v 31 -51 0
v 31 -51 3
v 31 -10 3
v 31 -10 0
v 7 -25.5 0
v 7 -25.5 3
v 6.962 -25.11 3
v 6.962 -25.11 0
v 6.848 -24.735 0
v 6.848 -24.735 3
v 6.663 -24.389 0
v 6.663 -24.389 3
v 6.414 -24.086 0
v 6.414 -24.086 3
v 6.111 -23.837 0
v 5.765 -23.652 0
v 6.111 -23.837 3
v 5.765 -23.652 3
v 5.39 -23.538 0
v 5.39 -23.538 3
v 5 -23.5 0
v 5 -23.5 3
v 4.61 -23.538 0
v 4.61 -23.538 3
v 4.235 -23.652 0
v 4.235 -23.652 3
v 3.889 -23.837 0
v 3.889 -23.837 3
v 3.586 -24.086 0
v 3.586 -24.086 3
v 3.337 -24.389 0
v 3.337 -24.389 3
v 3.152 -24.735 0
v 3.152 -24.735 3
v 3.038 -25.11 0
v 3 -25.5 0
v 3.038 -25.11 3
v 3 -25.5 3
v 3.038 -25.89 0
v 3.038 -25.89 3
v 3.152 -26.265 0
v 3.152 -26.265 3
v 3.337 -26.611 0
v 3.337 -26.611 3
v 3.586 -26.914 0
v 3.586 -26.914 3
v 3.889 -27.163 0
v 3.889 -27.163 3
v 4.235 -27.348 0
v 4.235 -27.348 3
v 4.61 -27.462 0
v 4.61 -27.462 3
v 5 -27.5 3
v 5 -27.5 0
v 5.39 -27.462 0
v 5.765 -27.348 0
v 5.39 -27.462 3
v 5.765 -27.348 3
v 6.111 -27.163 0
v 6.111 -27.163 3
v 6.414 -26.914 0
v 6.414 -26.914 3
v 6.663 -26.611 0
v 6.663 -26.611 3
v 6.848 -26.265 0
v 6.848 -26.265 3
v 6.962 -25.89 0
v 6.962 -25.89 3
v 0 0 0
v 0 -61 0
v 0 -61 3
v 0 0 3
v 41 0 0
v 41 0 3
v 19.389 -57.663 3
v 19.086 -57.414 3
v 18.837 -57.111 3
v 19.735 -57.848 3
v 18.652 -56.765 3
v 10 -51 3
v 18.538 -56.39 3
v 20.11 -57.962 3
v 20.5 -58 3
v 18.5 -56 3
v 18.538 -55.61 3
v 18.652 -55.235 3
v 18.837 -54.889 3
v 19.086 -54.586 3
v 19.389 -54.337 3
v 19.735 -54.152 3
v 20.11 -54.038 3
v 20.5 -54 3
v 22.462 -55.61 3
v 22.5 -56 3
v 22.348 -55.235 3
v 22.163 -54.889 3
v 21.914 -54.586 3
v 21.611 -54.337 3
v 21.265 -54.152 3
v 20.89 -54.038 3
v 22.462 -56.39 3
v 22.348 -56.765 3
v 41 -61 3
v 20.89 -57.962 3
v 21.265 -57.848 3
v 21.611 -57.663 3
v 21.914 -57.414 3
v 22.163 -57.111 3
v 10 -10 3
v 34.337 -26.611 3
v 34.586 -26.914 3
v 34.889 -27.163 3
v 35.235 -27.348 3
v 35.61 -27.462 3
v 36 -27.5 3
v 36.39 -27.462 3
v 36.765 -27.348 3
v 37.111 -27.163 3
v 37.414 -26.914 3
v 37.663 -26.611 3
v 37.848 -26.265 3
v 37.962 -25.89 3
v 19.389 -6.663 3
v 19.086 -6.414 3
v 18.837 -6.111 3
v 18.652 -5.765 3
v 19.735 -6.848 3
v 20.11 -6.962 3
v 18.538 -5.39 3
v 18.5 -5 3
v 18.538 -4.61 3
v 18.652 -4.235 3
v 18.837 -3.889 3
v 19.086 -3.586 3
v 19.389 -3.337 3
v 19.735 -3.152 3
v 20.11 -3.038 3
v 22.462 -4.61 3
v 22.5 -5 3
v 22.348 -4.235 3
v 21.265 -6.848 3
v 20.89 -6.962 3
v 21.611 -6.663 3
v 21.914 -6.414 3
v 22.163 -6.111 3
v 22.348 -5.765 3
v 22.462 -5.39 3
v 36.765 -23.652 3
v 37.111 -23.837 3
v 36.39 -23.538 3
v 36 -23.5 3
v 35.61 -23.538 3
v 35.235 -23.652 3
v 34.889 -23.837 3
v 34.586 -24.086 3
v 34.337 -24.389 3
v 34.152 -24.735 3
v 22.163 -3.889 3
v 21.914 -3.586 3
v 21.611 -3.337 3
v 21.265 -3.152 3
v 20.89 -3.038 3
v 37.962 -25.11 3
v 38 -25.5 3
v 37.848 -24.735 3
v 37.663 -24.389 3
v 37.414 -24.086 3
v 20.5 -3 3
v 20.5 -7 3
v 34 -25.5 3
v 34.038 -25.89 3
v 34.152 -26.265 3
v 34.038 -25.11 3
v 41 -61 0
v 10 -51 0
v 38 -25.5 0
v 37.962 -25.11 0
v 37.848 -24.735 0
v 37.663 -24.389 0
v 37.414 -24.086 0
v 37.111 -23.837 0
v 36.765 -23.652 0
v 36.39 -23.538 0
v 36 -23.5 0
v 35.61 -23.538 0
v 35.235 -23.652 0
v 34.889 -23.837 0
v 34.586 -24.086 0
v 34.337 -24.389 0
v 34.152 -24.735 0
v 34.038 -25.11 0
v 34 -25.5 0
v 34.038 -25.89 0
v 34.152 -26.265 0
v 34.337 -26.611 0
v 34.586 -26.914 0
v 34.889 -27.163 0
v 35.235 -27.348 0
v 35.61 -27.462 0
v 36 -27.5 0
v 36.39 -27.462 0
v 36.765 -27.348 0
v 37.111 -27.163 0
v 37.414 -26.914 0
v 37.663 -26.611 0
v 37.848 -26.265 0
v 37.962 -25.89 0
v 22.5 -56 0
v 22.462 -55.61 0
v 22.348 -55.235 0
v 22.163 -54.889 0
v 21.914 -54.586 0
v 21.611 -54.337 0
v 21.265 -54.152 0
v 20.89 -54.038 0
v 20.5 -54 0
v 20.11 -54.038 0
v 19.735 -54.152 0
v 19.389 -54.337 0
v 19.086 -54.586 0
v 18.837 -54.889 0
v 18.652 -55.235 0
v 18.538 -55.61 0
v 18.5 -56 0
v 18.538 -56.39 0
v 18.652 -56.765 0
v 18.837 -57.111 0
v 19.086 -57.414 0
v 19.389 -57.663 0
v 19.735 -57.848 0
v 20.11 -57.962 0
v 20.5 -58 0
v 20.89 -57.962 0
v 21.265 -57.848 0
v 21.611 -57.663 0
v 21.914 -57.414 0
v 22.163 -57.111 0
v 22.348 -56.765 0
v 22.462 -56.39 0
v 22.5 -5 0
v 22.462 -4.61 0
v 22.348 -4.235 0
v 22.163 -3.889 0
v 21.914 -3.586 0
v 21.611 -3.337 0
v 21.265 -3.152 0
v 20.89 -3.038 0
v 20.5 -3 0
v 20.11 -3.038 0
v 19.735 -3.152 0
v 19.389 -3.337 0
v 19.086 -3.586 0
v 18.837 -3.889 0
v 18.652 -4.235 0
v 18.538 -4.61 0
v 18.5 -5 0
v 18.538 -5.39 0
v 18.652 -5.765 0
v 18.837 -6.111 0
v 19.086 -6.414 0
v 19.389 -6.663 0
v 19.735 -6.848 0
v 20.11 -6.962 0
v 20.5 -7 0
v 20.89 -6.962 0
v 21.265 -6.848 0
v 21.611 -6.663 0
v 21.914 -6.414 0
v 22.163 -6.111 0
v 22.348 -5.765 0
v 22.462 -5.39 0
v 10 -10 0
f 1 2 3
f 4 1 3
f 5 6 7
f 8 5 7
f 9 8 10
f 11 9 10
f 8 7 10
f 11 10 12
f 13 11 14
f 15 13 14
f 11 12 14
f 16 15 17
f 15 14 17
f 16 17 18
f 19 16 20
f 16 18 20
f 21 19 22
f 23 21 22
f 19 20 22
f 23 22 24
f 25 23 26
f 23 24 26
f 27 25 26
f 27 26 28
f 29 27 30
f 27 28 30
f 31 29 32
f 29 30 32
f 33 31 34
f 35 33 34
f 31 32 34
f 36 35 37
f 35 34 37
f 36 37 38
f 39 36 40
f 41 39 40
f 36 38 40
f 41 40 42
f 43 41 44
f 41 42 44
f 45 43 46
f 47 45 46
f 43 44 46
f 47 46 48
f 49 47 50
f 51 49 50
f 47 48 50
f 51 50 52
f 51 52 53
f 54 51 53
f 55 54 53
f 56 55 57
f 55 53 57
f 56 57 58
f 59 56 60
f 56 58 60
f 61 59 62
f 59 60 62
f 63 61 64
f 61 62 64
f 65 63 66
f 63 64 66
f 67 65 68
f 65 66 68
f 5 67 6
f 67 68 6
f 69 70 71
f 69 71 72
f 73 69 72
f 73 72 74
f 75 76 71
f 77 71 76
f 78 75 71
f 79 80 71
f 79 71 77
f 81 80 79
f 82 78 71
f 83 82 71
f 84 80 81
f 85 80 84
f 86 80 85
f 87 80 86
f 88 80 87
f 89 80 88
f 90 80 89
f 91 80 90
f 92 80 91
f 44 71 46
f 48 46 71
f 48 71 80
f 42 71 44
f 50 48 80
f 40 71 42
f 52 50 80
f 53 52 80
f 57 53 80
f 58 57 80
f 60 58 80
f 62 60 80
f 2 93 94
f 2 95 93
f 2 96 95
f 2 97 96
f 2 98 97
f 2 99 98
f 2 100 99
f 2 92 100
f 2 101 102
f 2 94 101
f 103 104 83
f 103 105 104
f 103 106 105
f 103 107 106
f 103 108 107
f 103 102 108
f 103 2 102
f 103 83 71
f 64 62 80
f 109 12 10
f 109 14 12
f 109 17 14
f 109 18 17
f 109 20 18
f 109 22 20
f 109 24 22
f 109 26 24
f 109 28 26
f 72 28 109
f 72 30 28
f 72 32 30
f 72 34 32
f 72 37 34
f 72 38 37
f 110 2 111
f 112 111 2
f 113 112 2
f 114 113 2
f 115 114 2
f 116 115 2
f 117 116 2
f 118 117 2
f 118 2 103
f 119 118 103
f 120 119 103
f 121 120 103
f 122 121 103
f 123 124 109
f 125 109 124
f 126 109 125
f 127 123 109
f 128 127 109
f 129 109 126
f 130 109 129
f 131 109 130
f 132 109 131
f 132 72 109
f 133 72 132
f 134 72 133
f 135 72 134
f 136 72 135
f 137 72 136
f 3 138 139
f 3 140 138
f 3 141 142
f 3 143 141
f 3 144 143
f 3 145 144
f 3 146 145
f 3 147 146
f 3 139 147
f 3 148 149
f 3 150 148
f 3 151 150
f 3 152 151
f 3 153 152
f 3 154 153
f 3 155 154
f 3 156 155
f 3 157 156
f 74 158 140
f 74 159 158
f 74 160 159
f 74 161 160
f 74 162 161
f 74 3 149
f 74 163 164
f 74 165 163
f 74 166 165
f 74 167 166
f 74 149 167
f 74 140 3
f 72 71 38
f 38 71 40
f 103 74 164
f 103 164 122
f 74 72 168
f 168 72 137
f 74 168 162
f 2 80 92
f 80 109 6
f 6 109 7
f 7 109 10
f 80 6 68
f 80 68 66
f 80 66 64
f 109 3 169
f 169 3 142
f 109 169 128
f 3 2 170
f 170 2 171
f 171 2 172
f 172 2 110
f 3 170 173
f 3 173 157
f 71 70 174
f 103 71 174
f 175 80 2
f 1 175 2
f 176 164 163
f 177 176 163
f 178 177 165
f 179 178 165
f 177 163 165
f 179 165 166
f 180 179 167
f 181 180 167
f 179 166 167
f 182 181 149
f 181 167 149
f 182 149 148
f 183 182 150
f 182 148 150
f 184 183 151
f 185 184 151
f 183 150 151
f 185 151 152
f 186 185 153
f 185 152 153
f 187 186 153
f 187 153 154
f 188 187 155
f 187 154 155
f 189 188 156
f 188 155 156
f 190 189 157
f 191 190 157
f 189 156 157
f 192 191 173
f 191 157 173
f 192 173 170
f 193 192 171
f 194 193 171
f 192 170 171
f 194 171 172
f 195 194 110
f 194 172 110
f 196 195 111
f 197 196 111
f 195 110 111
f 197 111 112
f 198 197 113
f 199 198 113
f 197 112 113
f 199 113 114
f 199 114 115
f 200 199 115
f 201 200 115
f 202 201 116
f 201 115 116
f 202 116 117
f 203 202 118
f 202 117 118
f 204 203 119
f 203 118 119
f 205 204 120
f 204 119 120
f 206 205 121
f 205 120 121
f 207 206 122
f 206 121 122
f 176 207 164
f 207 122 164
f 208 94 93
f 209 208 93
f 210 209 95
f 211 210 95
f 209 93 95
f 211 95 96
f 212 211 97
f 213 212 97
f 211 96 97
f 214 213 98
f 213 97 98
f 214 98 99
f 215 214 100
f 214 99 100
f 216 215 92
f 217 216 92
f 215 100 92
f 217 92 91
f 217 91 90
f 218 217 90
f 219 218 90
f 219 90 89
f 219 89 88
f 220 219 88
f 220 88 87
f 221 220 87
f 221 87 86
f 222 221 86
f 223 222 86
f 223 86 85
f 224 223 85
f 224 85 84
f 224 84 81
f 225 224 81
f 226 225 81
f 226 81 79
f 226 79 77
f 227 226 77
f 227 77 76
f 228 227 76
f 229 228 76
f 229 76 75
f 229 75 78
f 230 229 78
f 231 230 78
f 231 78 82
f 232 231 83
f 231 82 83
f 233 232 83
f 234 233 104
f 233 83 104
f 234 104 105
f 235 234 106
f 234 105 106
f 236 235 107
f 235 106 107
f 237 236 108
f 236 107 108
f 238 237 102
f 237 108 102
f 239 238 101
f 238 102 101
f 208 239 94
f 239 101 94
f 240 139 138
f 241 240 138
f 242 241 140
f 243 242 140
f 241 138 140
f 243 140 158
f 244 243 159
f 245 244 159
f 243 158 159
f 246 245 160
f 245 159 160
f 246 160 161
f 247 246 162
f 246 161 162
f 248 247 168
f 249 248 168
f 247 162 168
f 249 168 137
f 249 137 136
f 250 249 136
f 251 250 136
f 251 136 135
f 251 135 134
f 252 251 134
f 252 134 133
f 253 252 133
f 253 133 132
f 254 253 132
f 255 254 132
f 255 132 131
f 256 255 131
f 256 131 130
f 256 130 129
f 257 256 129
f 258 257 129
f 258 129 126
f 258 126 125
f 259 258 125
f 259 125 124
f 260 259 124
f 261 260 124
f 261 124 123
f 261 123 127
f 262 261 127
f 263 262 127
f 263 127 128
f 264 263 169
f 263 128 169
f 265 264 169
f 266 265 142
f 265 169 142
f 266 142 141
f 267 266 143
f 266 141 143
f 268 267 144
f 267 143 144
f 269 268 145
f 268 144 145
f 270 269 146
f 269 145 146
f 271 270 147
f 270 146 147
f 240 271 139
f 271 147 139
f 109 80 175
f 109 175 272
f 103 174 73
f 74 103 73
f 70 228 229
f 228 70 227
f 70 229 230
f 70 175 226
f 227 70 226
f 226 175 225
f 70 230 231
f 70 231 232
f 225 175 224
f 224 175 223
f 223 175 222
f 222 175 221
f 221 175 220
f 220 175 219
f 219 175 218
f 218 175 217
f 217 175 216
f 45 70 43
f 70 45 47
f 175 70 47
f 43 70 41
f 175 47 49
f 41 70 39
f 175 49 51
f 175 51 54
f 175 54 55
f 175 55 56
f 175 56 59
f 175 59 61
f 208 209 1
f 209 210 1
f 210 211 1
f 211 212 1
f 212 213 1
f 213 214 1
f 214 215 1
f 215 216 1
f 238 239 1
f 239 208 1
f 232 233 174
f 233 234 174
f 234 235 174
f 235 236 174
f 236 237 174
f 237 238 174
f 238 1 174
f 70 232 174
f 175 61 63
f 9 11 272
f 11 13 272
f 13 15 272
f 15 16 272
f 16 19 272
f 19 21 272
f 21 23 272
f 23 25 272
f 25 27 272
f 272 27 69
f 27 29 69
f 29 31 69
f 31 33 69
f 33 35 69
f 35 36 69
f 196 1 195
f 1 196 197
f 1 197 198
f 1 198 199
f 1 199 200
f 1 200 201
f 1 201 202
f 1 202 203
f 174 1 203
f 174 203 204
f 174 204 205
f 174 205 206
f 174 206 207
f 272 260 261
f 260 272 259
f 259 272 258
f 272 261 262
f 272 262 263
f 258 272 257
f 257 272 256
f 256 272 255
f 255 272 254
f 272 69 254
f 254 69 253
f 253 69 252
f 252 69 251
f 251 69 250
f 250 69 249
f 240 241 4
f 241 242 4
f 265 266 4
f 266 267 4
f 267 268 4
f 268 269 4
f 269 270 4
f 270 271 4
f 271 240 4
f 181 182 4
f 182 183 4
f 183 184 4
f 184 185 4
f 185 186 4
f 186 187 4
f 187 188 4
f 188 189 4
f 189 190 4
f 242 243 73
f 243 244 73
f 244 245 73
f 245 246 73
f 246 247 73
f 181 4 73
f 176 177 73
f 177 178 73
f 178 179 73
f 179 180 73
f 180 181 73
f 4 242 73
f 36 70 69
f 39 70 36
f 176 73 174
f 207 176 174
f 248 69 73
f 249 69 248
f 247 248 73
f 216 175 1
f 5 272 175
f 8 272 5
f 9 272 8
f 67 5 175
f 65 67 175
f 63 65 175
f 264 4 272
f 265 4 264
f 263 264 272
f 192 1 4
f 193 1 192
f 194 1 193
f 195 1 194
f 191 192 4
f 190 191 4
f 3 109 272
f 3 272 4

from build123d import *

# Parameters (mm, degrees)
SKETCH1_W           = 41
SKETCH1_H           = 61
BOSS_EXTRUDE1_DEPTH = 3
SKETCH2_W           = 21
SKETCH2_H           = 41
CUT_EXTRUDE1_DEPTH  = 3
SKETCH3_R           = 2
CUT_EXTRUDE2_DEPTH  = 3
SKETCH4_R           = 2
CUT_EXTRUDE3_DEPTH  = 10


with BuildPart() as part:
    # Sketch1 → Boss-Extrude1 (new body)
    with BuildSketch(Plane.XY):
        with Locations((20.5, -30.5)):
            Rectangle(SKETCH1_W, SKETCH1_H)
    extrude(amount=BOSS_EXTRUDE1_DEPTH)

    # Sketch2 → Cut-Extrude1 (cut)
    with BuildSketch(Plane.XY.offset(3)):
        with Locations((20.5, -30.5)):
            Rectangle(SKETCH2_W, SKETCH2_H)
    extrude(amount=-CUT_EXTRUDE1_DEPTH, mode=Mode.SUBTRACT)

    # Sketch3 → Cut-Extrude2 (cut)
    with BuildSketch(Plane.XY.offset(3)):
        with Locations((36, -25.5)):
            Circle(SKETCH3_R)
        with Locations((5, -25.5)):
            Circle(SKETCH3_R)
    extrude(amount=-CUT_EXTRUDE2_DEPTH, mode=Mode.SUBTRACT)

    # Sketch4 → Cut-Extrude3 (cut)
    with BuildSketch(Plane.XY.offset(3)):
        with Locations((20.5, -5)):
            Circle(SKETCH4_R)
        with Locations((20.5, -56)):
            Circle(SKETCH4_R)
    extrude(amount=-CUT_EXTRUDE3_DEPTH, mode=Mode.SUBTRACT)


solid = part.part
